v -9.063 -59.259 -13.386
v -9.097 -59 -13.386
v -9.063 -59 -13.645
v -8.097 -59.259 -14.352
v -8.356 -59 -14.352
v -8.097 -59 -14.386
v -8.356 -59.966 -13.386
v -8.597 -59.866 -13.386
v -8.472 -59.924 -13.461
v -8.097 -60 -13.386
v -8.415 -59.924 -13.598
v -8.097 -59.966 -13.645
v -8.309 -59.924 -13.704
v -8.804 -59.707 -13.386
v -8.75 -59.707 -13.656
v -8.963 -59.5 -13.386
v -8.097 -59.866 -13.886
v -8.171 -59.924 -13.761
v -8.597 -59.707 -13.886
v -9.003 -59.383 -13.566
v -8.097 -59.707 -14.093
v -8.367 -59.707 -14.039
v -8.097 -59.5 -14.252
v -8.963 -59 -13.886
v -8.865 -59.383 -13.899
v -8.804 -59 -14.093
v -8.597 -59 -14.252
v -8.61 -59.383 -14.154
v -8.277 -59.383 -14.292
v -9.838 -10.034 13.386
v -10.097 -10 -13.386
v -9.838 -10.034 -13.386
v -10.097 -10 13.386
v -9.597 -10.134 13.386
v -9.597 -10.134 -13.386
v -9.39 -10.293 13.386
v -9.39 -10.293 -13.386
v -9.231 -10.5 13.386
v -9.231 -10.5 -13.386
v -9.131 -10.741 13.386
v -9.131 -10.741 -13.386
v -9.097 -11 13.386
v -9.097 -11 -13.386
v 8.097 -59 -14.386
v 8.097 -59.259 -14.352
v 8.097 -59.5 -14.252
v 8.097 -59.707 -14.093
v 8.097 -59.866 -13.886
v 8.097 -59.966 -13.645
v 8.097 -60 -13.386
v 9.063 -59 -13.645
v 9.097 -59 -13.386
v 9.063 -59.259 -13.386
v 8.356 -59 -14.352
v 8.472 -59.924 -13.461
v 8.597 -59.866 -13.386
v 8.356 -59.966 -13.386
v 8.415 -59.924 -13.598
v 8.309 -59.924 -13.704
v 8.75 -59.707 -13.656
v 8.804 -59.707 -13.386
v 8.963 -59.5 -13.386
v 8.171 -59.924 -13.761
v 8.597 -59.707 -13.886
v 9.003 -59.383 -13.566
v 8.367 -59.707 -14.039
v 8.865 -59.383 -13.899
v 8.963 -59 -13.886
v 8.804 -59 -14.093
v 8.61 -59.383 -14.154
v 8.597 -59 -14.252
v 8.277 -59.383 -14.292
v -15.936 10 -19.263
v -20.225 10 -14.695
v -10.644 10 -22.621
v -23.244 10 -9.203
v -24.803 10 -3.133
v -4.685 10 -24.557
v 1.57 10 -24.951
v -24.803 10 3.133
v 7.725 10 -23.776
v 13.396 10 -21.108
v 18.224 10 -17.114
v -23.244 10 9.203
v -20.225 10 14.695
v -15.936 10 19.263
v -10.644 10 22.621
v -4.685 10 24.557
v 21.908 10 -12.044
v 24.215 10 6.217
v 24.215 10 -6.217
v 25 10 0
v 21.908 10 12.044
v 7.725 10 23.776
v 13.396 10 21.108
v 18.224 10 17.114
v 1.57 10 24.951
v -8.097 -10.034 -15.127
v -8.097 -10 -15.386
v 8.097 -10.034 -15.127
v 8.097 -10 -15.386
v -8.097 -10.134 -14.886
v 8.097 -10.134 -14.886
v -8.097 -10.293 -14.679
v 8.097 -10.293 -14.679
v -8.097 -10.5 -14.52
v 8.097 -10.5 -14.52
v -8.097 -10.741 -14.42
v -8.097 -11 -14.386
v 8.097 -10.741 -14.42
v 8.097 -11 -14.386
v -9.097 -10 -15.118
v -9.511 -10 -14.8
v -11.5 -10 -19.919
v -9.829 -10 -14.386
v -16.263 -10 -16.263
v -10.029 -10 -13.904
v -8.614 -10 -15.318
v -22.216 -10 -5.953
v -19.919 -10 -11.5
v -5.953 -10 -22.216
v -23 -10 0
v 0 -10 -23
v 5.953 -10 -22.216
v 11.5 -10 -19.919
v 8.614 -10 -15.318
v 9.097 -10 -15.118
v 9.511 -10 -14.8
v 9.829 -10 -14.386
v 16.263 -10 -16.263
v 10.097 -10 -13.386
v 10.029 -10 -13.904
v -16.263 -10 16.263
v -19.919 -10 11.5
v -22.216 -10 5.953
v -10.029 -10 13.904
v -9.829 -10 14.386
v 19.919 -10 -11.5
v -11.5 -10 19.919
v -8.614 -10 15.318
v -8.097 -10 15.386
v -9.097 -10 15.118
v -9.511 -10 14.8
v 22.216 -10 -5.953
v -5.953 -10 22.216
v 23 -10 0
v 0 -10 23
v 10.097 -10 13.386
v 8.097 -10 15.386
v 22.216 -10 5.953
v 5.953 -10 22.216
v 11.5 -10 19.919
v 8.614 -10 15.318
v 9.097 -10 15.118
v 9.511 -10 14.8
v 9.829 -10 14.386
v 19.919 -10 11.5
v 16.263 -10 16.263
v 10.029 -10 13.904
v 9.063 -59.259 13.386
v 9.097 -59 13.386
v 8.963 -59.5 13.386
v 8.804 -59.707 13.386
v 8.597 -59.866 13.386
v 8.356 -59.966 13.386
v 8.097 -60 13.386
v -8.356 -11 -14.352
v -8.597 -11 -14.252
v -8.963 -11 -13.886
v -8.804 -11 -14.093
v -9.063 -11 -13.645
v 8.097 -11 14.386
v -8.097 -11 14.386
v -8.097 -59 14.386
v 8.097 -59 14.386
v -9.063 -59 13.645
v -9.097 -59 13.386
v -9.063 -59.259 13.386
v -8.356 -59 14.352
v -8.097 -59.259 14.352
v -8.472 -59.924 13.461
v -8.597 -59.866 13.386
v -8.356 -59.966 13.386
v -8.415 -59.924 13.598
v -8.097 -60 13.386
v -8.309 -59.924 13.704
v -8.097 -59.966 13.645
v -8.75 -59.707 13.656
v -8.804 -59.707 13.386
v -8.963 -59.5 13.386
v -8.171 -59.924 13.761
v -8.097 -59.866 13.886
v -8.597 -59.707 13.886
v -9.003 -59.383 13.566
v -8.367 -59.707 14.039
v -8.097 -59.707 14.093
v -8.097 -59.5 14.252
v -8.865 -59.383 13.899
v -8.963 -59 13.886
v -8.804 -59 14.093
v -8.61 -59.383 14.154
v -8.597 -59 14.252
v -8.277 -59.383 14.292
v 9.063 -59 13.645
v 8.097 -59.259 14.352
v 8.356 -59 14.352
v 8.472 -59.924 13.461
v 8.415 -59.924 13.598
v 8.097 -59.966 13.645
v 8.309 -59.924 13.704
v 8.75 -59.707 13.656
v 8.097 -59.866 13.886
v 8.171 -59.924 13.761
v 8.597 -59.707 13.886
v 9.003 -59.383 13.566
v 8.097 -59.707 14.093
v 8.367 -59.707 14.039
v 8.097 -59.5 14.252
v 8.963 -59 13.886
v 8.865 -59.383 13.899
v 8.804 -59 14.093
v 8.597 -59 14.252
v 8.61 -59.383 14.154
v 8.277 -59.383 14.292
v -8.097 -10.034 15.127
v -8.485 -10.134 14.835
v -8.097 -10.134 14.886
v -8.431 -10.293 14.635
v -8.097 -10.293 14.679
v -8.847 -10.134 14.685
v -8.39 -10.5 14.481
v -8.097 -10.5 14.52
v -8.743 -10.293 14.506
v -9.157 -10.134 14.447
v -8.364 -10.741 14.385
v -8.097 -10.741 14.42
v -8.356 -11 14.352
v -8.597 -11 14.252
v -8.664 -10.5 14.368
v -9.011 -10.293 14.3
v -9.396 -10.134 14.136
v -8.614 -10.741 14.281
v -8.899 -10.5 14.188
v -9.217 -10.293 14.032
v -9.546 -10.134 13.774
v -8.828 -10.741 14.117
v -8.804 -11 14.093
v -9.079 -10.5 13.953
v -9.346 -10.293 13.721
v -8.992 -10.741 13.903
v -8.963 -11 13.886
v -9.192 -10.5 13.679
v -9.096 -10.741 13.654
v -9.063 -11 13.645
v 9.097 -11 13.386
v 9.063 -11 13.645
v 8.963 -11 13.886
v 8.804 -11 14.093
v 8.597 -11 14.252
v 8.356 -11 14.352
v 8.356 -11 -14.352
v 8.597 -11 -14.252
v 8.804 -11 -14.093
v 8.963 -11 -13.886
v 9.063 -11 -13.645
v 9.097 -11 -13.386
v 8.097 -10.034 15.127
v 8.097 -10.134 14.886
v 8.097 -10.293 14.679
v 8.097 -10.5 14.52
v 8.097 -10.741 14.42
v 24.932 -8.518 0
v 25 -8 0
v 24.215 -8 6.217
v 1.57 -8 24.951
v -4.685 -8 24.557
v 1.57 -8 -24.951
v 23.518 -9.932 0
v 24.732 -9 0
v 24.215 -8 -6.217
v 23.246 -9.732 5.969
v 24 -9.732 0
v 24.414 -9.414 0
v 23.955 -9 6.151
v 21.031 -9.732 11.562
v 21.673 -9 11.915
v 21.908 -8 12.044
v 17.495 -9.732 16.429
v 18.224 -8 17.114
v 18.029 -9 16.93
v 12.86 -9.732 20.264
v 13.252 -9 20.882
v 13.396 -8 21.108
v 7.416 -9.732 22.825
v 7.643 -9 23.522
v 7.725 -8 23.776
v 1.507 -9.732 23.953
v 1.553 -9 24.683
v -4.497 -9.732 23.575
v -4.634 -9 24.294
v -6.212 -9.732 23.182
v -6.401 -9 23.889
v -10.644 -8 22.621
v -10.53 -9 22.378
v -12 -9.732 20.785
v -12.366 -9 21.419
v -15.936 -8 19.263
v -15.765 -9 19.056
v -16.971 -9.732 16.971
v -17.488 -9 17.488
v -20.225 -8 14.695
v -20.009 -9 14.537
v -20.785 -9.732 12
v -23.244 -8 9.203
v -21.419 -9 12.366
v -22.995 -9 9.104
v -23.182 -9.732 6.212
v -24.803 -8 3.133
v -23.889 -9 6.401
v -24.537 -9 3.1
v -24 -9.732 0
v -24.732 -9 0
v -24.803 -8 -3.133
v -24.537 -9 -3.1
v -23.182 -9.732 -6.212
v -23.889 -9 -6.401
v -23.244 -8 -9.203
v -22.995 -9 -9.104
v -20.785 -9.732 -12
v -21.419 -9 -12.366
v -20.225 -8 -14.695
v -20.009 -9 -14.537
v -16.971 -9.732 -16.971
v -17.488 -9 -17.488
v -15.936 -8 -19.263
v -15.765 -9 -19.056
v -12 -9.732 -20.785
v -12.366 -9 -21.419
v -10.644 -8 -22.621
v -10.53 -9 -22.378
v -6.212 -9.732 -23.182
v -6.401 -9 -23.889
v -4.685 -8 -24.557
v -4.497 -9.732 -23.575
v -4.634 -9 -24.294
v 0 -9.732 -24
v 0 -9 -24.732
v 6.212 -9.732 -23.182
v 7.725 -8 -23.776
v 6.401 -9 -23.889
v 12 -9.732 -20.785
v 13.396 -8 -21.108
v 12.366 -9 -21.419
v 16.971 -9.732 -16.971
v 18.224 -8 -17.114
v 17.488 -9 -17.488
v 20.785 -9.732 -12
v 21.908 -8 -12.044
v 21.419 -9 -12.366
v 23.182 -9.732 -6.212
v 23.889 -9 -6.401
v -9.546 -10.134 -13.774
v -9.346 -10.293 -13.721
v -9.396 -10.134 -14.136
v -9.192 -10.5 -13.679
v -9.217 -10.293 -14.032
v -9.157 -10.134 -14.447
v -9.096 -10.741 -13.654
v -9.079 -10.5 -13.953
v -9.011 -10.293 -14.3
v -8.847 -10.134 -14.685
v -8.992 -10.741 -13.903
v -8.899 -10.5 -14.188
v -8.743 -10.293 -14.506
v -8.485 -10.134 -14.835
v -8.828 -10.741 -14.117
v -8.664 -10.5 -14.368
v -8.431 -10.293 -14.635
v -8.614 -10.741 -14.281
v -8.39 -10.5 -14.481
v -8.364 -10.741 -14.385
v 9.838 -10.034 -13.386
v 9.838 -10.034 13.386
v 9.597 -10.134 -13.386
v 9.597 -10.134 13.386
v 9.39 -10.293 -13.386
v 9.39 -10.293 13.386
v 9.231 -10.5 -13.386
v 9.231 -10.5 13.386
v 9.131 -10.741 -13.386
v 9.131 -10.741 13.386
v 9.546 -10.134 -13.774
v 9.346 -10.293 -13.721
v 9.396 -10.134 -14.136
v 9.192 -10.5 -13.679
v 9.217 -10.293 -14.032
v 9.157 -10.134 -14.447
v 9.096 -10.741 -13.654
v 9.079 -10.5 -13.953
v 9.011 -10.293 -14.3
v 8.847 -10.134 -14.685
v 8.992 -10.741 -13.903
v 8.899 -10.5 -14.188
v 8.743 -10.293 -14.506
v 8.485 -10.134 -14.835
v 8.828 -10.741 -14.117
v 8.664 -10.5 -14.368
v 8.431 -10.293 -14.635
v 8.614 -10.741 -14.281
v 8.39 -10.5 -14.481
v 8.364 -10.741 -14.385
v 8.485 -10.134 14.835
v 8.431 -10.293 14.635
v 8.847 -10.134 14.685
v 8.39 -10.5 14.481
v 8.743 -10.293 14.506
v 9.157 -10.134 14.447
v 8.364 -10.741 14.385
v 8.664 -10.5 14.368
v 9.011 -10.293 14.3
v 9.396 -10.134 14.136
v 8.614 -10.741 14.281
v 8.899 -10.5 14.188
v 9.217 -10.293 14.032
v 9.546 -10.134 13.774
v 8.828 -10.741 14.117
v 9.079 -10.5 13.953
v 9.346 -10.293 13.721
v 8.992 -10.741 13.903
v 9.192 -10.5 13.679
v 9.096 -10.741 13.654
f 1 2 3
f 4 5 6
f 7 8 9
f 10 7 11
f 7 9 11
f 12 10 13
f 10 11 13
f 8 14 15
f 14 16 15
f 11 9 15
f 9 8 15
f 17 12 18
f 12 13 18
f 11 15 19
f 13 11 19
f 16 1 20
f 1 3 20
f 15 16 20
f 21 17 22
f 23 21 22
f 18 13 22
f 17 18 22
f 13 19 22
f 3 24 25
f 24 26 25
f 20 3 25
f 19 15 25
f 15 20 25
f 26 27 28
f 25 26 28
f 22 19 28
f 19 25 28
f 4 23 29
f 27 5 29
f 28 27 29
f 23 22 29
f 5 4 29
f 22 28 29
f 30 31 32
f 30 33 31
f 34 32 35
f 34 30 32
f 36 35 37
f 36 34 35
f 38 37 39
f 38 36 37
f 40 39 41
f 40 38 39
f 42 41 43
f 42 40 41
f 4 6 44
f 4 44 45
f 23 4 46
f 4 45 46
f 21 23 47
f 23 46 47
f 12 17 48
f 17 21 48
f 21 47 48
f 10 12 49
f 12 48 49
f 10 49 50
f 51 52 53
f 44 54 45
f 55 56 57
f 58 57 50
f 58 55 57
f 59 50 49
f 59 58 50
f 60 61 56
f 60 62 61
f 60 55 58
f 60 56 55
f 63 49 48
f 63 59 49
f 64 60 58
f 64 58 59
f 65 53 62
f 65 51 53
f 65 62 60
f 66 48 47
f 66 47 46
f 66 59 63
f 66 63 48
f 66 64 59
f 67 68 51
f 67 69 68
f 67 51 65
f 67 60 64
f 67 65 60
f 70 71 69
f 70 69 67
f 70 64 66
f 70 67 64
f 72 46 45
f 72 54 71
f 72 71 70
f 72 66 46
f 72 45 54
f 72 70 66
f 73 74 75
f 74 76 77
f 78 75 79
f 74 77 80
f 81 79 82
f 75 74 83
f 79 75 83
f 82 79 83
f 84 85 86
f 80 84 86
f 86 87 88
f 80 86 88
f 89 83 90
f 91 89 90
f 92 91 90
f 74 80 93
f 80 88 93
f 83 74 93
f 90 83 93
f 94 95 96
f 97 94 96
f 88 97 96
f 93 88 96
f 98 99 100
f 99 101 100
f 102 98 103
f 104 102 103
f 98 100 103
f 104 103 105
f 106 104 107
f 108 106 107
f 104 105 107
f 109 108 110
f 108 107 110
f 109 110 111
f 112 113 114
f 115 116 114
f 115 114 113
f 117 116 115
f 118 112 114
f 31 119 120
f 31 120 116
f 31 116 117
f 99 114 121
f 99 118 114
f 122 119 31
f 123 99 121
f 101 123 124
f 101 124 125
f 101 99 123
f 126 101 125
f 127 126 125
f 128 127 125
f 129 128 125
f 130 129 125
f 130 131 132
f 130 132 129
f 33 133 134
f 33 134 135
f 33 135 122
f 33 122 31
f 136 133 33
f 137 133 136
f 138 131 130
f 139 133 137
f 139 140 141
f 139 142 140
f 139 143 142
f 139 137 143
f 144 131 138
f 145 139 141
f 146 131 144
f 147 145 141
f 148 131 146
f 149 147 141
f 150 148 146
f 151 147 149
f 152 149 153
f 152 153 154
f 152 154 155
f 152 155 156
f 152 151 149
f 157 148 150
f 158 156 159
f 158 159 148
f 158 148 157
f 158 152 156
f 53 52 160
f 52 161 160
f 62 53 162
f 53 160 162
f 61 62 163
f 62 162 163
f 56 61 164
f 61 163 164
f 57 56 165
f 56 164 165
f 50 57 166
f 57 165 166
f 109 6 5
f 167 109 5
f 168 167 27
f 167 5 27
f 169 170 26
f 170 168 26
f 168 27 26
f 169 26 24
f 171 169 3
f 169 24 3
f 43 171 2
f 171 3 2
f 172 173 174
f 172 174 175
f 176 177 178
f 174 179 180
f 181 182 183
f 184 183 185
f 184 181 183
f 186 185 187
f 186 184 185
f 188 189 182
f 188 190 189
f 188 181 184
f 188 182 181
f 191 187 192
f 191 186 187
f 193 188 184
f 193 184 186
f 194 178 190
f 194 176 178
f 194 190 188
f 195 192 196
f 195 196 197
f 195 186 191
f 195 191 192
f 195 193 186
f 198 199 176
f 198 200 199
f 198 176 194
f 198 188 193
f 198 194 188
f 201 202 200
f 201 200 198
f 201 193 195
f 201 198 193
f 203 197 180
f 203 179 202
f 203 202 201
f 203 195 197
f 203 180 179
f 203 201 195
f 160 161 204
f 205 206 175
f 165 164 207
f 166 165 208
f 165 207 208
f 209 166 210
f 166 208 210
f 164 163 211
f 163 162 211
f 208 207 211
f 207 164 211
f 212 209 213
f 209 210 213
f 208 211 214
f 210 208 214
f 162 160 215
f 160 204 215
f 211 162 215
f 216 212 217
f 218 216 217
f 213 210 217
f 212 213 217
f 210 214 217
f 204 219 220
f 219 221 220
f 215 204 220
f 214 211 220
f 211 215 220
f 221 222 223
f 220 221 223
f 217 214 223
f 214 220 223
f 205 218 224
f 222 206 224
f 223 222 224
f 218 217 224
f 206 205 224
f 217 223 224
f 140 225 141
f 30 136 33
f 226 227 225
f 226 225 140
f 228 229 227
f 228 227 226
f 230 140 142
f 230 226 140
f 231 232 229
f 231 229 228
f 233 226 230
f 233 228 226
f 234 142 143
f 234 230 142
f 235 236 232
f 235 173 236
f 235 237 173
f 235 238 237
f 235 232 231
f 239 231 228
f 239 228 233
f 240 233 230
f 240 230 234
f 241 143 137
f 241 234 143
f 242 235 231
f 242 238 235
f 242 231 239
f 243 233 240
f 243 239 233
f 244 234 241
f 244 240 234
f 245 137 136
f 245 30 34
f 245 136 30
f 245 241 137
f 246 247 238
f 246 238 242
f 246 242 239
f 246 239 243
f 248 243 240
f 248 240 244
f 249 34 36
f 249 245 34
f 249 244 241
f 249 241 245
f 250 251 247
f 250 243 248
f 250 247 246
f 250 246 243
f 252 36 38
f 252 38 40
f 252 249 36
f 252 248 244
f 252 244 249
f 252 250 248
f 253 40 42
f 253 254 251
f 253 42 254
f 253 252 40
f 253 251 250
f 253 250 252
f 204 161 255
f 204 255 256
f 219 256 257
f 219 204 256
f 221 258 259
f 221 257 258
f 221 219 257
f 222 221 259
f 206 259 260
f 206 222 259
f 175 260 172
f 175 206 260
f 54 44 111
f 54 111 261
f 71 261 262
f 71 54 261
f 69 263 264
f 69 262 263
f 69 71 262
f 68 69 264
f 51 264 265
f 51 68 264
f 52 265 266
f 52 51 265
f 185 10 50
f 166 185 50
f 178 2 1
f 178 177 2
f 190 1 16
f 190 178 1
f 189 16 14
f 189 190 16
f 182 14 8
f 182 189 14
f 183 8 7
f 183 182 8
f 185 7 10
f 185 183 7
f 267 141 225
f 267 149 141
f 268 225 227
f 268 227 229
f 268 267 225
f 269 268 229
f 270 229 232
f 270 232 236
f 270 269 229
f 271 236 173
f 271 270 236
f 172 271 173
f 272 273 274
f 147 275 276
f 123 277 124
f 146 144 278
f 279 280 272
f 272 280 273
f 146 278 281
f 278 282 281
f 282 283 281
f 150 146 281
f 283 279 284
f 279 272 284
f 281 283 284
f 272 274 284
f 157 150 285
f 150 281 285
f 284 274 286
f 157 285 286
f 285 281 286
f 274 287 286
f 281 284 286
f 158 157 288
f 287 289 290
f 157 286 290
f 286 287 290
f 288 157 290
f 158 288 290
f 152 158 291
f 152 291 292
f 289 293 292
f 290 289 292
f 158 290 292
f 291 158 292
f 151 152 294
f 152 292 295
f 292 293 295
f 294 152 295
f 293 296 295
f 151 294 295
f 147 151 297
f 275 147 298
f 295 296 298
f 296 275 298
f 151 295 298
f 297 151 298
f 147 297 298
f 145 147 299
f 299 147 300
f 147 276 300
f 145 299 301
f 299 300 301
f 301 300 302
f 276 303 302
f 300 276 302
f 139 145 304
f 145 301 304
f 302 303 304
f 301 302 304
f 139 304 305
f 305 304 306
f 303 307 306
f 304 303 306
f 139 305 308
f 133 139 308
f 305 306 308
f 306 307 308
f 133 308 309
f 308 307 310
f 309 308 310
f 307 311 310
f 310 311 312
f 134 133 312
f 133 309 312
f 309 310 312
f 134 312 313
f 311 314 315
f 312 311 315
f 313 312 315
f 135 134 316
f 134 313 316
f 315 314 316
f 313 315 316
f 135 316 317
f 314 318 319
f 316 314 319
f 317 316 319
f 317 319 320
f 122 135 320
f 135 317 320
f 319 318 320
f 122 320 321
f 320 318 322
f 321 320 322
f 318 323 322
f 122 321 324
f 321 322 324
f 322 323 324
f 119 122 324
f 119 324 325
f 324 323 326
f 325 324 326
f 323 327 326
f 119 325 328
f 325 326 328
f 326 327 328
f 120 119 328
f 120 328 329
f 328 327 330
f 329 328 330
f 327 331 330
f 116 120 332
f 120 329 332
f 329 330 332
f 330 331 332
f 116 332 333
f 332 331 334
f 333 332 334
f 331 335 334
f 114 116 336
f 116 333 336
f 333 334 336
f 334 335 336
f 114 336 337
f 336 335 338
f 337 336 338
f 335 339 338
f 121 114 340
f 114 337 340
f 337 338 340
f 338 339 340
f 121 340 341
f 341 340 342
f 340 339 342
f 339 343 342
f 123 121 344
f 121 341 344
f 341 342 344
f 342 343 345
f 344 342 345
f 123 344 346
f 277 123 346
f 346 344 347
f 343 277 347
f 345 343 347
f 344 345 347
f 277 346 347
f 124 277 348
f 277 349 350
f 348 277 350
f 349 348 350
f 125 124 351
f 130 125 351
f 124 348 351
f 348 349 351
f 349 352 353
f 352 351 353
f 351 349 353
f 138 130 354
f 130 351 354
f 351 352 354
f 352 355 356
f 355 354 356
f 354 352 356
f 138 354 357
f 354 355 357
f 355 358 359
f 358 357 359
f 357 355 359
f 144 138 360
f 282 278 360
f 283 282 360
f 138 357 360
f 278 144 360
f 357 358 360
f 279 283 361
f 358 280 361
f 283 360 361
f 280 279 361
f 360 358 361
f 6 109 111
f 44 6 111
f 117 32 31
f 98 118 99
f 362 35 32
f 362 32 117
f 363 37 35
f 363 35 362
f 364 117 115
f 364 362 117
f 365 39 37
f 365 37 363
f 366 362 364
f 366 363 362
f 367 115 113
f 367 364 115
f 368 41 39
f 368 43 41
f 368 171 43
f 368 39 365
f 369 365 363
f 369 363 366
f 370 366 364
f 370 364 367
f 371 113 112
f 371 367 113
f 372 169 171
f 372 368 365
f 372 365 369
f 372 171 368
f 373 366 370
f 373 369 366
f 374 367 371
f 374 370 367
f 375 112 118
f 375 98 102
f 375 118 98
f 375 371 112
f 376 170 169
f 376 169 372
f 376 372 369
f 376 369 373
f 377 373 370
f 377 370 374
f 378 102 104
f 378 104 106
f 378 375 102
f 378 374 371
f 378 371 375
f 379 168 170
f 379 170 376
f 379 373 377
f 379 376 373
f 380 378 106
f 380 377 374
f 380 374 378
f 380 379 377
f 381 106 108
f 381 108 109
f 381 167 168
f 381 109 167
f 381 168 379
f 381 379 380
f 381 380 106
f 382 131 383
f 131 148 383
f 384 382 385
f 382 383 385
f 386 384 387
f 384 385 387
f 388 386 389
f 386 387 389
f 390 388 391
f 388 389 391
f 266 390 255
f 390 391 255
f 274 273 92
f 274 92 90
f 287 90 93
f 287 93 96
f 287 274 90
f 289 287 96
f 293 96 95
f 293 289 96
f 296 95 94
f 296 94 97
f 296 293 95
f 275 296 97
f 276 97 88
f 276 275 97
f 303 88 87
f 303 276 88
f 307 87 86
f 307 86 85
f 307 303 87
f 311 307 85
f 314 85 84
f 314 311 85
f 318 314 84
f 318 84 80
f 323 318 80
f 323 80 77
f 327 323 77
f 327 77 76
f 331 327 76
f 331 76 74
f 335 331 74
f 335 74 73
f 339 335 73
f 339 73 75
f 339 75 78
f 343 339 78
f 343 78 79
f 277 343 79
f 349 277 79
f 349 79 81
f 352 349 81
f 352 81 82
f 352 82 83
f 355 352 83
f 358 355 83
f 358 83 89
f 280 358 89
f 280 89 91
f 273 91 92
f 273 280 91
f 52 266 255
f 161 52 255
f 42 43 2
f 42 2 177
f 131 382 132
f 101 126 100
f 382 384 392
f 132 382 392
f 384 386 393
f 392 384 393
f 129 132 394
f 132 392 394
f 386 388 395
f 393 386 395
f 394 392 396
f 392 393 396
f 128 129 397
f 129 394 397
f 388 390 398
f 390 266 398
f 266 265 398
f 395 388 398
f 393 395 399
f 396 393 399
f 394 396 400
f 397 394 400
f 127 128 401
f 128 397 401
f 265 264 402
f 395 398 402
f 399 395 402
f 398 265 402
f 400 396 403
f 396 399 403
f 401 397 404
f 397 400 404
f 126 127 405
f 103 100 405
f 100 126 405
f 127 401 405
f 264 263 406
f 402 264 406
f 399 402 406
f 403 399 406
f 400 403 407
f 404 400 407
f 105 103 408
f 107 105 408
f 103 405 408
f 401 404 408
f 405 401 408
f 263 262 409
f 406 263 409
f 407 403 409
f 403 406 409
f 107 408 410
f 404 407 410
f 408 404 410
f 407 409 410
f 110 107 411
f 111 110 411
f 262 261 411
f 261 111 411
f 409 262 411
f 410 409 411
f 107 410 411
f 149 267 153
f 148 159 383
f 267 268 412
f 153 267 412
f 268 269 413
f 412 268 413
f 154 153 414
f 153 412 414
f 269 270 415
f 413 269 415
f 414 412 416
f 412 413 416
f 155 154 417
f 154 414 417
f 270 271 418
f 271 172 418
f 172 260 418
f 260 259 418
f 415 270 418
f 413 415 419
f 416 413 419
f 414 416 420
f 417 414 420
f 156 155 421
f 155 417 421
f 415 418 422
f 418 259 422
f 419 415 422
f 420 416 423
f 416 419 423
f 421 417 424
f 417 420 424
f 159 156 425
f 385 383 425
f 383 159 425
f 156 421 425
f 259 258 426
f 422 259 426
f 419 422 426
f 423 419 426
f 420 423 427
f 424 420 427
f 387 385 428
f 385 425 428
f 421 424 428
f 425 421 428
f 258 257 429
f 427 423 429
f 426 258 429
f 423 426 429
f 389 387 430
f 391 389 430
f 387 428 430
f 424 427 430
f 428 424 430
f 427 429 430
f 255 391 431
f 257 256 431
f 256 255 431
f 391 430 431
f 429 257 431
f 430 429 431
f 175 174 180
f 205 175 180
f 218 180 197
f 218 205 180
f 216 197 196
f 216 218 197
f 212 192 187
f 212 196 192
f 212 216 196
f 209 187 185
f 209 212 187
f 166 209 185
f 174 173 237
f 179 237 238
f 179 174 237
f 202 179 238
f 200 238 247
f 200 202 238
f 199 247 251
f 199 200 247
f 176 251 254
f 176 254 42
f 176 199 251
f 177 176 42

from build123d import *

# Parameters (mm, degrees)
F0_R     = 25
F1_DEPTH = 10
F2_W     = 18.193654716
F2_H     = 28.7717729807
F3_DEPTH = 50
F4_R     = 1
F5_R     = 2


with BuildPart() as f1:
    # F0 (on Front) → F1 (new body, symmetric)
    with BuildSketch(Plane.XZ):
        Circle(F0_R)
    extrude(amount=F1_DEPTH, both=True)

    # F2 (on face) → F3 (join)
    with BuildSketch(Plane.XZ.offset(10)):
        Rectangle(F2_W, F2_H)
    extrude(amount=F3_DEPTH)

    # F4
    f4_edges = [f1.edges().sort_by_distance(p)[0] for p in [
        (0, -10, 14.385886),
        (9.096827, -10, 0),
        (-9.096827, -10, 0),
        (0, -10, -14.385886),
        (-9.096827, -35, -14.385886),
        (-9.096827, -35, 14.385886),
        (9.096827, -35, 14.385886),
        (9.096827, -35, -14.385886),
        (9.096827, -60, 0),
        (-9.096827, -60, 0),
        (0, -60, 14.385886),
        (0, -60, -14.385886),
    ]]
    fillet(f4_edges, radius=F4_R)

    # F5
    f5_edges = [f1.edges().sort_by_distance(p)[0] for p in [
        (0, -10, 15.385886),
        (9.511041, -10, 14.8001),
        (-9.511041, -10, 14.8001),
        (10.096827, -10, 0),
        (-10.096827, -10, 0),
        (9.511041, -10, -14.8001),
        (-9.511041, -10, -14.8001),
        (0, -10, -15.385886),
        (-25, -10, 0),
    ]]
    fillet(f5_edges, radius=F5_R)


solid = f1.part
